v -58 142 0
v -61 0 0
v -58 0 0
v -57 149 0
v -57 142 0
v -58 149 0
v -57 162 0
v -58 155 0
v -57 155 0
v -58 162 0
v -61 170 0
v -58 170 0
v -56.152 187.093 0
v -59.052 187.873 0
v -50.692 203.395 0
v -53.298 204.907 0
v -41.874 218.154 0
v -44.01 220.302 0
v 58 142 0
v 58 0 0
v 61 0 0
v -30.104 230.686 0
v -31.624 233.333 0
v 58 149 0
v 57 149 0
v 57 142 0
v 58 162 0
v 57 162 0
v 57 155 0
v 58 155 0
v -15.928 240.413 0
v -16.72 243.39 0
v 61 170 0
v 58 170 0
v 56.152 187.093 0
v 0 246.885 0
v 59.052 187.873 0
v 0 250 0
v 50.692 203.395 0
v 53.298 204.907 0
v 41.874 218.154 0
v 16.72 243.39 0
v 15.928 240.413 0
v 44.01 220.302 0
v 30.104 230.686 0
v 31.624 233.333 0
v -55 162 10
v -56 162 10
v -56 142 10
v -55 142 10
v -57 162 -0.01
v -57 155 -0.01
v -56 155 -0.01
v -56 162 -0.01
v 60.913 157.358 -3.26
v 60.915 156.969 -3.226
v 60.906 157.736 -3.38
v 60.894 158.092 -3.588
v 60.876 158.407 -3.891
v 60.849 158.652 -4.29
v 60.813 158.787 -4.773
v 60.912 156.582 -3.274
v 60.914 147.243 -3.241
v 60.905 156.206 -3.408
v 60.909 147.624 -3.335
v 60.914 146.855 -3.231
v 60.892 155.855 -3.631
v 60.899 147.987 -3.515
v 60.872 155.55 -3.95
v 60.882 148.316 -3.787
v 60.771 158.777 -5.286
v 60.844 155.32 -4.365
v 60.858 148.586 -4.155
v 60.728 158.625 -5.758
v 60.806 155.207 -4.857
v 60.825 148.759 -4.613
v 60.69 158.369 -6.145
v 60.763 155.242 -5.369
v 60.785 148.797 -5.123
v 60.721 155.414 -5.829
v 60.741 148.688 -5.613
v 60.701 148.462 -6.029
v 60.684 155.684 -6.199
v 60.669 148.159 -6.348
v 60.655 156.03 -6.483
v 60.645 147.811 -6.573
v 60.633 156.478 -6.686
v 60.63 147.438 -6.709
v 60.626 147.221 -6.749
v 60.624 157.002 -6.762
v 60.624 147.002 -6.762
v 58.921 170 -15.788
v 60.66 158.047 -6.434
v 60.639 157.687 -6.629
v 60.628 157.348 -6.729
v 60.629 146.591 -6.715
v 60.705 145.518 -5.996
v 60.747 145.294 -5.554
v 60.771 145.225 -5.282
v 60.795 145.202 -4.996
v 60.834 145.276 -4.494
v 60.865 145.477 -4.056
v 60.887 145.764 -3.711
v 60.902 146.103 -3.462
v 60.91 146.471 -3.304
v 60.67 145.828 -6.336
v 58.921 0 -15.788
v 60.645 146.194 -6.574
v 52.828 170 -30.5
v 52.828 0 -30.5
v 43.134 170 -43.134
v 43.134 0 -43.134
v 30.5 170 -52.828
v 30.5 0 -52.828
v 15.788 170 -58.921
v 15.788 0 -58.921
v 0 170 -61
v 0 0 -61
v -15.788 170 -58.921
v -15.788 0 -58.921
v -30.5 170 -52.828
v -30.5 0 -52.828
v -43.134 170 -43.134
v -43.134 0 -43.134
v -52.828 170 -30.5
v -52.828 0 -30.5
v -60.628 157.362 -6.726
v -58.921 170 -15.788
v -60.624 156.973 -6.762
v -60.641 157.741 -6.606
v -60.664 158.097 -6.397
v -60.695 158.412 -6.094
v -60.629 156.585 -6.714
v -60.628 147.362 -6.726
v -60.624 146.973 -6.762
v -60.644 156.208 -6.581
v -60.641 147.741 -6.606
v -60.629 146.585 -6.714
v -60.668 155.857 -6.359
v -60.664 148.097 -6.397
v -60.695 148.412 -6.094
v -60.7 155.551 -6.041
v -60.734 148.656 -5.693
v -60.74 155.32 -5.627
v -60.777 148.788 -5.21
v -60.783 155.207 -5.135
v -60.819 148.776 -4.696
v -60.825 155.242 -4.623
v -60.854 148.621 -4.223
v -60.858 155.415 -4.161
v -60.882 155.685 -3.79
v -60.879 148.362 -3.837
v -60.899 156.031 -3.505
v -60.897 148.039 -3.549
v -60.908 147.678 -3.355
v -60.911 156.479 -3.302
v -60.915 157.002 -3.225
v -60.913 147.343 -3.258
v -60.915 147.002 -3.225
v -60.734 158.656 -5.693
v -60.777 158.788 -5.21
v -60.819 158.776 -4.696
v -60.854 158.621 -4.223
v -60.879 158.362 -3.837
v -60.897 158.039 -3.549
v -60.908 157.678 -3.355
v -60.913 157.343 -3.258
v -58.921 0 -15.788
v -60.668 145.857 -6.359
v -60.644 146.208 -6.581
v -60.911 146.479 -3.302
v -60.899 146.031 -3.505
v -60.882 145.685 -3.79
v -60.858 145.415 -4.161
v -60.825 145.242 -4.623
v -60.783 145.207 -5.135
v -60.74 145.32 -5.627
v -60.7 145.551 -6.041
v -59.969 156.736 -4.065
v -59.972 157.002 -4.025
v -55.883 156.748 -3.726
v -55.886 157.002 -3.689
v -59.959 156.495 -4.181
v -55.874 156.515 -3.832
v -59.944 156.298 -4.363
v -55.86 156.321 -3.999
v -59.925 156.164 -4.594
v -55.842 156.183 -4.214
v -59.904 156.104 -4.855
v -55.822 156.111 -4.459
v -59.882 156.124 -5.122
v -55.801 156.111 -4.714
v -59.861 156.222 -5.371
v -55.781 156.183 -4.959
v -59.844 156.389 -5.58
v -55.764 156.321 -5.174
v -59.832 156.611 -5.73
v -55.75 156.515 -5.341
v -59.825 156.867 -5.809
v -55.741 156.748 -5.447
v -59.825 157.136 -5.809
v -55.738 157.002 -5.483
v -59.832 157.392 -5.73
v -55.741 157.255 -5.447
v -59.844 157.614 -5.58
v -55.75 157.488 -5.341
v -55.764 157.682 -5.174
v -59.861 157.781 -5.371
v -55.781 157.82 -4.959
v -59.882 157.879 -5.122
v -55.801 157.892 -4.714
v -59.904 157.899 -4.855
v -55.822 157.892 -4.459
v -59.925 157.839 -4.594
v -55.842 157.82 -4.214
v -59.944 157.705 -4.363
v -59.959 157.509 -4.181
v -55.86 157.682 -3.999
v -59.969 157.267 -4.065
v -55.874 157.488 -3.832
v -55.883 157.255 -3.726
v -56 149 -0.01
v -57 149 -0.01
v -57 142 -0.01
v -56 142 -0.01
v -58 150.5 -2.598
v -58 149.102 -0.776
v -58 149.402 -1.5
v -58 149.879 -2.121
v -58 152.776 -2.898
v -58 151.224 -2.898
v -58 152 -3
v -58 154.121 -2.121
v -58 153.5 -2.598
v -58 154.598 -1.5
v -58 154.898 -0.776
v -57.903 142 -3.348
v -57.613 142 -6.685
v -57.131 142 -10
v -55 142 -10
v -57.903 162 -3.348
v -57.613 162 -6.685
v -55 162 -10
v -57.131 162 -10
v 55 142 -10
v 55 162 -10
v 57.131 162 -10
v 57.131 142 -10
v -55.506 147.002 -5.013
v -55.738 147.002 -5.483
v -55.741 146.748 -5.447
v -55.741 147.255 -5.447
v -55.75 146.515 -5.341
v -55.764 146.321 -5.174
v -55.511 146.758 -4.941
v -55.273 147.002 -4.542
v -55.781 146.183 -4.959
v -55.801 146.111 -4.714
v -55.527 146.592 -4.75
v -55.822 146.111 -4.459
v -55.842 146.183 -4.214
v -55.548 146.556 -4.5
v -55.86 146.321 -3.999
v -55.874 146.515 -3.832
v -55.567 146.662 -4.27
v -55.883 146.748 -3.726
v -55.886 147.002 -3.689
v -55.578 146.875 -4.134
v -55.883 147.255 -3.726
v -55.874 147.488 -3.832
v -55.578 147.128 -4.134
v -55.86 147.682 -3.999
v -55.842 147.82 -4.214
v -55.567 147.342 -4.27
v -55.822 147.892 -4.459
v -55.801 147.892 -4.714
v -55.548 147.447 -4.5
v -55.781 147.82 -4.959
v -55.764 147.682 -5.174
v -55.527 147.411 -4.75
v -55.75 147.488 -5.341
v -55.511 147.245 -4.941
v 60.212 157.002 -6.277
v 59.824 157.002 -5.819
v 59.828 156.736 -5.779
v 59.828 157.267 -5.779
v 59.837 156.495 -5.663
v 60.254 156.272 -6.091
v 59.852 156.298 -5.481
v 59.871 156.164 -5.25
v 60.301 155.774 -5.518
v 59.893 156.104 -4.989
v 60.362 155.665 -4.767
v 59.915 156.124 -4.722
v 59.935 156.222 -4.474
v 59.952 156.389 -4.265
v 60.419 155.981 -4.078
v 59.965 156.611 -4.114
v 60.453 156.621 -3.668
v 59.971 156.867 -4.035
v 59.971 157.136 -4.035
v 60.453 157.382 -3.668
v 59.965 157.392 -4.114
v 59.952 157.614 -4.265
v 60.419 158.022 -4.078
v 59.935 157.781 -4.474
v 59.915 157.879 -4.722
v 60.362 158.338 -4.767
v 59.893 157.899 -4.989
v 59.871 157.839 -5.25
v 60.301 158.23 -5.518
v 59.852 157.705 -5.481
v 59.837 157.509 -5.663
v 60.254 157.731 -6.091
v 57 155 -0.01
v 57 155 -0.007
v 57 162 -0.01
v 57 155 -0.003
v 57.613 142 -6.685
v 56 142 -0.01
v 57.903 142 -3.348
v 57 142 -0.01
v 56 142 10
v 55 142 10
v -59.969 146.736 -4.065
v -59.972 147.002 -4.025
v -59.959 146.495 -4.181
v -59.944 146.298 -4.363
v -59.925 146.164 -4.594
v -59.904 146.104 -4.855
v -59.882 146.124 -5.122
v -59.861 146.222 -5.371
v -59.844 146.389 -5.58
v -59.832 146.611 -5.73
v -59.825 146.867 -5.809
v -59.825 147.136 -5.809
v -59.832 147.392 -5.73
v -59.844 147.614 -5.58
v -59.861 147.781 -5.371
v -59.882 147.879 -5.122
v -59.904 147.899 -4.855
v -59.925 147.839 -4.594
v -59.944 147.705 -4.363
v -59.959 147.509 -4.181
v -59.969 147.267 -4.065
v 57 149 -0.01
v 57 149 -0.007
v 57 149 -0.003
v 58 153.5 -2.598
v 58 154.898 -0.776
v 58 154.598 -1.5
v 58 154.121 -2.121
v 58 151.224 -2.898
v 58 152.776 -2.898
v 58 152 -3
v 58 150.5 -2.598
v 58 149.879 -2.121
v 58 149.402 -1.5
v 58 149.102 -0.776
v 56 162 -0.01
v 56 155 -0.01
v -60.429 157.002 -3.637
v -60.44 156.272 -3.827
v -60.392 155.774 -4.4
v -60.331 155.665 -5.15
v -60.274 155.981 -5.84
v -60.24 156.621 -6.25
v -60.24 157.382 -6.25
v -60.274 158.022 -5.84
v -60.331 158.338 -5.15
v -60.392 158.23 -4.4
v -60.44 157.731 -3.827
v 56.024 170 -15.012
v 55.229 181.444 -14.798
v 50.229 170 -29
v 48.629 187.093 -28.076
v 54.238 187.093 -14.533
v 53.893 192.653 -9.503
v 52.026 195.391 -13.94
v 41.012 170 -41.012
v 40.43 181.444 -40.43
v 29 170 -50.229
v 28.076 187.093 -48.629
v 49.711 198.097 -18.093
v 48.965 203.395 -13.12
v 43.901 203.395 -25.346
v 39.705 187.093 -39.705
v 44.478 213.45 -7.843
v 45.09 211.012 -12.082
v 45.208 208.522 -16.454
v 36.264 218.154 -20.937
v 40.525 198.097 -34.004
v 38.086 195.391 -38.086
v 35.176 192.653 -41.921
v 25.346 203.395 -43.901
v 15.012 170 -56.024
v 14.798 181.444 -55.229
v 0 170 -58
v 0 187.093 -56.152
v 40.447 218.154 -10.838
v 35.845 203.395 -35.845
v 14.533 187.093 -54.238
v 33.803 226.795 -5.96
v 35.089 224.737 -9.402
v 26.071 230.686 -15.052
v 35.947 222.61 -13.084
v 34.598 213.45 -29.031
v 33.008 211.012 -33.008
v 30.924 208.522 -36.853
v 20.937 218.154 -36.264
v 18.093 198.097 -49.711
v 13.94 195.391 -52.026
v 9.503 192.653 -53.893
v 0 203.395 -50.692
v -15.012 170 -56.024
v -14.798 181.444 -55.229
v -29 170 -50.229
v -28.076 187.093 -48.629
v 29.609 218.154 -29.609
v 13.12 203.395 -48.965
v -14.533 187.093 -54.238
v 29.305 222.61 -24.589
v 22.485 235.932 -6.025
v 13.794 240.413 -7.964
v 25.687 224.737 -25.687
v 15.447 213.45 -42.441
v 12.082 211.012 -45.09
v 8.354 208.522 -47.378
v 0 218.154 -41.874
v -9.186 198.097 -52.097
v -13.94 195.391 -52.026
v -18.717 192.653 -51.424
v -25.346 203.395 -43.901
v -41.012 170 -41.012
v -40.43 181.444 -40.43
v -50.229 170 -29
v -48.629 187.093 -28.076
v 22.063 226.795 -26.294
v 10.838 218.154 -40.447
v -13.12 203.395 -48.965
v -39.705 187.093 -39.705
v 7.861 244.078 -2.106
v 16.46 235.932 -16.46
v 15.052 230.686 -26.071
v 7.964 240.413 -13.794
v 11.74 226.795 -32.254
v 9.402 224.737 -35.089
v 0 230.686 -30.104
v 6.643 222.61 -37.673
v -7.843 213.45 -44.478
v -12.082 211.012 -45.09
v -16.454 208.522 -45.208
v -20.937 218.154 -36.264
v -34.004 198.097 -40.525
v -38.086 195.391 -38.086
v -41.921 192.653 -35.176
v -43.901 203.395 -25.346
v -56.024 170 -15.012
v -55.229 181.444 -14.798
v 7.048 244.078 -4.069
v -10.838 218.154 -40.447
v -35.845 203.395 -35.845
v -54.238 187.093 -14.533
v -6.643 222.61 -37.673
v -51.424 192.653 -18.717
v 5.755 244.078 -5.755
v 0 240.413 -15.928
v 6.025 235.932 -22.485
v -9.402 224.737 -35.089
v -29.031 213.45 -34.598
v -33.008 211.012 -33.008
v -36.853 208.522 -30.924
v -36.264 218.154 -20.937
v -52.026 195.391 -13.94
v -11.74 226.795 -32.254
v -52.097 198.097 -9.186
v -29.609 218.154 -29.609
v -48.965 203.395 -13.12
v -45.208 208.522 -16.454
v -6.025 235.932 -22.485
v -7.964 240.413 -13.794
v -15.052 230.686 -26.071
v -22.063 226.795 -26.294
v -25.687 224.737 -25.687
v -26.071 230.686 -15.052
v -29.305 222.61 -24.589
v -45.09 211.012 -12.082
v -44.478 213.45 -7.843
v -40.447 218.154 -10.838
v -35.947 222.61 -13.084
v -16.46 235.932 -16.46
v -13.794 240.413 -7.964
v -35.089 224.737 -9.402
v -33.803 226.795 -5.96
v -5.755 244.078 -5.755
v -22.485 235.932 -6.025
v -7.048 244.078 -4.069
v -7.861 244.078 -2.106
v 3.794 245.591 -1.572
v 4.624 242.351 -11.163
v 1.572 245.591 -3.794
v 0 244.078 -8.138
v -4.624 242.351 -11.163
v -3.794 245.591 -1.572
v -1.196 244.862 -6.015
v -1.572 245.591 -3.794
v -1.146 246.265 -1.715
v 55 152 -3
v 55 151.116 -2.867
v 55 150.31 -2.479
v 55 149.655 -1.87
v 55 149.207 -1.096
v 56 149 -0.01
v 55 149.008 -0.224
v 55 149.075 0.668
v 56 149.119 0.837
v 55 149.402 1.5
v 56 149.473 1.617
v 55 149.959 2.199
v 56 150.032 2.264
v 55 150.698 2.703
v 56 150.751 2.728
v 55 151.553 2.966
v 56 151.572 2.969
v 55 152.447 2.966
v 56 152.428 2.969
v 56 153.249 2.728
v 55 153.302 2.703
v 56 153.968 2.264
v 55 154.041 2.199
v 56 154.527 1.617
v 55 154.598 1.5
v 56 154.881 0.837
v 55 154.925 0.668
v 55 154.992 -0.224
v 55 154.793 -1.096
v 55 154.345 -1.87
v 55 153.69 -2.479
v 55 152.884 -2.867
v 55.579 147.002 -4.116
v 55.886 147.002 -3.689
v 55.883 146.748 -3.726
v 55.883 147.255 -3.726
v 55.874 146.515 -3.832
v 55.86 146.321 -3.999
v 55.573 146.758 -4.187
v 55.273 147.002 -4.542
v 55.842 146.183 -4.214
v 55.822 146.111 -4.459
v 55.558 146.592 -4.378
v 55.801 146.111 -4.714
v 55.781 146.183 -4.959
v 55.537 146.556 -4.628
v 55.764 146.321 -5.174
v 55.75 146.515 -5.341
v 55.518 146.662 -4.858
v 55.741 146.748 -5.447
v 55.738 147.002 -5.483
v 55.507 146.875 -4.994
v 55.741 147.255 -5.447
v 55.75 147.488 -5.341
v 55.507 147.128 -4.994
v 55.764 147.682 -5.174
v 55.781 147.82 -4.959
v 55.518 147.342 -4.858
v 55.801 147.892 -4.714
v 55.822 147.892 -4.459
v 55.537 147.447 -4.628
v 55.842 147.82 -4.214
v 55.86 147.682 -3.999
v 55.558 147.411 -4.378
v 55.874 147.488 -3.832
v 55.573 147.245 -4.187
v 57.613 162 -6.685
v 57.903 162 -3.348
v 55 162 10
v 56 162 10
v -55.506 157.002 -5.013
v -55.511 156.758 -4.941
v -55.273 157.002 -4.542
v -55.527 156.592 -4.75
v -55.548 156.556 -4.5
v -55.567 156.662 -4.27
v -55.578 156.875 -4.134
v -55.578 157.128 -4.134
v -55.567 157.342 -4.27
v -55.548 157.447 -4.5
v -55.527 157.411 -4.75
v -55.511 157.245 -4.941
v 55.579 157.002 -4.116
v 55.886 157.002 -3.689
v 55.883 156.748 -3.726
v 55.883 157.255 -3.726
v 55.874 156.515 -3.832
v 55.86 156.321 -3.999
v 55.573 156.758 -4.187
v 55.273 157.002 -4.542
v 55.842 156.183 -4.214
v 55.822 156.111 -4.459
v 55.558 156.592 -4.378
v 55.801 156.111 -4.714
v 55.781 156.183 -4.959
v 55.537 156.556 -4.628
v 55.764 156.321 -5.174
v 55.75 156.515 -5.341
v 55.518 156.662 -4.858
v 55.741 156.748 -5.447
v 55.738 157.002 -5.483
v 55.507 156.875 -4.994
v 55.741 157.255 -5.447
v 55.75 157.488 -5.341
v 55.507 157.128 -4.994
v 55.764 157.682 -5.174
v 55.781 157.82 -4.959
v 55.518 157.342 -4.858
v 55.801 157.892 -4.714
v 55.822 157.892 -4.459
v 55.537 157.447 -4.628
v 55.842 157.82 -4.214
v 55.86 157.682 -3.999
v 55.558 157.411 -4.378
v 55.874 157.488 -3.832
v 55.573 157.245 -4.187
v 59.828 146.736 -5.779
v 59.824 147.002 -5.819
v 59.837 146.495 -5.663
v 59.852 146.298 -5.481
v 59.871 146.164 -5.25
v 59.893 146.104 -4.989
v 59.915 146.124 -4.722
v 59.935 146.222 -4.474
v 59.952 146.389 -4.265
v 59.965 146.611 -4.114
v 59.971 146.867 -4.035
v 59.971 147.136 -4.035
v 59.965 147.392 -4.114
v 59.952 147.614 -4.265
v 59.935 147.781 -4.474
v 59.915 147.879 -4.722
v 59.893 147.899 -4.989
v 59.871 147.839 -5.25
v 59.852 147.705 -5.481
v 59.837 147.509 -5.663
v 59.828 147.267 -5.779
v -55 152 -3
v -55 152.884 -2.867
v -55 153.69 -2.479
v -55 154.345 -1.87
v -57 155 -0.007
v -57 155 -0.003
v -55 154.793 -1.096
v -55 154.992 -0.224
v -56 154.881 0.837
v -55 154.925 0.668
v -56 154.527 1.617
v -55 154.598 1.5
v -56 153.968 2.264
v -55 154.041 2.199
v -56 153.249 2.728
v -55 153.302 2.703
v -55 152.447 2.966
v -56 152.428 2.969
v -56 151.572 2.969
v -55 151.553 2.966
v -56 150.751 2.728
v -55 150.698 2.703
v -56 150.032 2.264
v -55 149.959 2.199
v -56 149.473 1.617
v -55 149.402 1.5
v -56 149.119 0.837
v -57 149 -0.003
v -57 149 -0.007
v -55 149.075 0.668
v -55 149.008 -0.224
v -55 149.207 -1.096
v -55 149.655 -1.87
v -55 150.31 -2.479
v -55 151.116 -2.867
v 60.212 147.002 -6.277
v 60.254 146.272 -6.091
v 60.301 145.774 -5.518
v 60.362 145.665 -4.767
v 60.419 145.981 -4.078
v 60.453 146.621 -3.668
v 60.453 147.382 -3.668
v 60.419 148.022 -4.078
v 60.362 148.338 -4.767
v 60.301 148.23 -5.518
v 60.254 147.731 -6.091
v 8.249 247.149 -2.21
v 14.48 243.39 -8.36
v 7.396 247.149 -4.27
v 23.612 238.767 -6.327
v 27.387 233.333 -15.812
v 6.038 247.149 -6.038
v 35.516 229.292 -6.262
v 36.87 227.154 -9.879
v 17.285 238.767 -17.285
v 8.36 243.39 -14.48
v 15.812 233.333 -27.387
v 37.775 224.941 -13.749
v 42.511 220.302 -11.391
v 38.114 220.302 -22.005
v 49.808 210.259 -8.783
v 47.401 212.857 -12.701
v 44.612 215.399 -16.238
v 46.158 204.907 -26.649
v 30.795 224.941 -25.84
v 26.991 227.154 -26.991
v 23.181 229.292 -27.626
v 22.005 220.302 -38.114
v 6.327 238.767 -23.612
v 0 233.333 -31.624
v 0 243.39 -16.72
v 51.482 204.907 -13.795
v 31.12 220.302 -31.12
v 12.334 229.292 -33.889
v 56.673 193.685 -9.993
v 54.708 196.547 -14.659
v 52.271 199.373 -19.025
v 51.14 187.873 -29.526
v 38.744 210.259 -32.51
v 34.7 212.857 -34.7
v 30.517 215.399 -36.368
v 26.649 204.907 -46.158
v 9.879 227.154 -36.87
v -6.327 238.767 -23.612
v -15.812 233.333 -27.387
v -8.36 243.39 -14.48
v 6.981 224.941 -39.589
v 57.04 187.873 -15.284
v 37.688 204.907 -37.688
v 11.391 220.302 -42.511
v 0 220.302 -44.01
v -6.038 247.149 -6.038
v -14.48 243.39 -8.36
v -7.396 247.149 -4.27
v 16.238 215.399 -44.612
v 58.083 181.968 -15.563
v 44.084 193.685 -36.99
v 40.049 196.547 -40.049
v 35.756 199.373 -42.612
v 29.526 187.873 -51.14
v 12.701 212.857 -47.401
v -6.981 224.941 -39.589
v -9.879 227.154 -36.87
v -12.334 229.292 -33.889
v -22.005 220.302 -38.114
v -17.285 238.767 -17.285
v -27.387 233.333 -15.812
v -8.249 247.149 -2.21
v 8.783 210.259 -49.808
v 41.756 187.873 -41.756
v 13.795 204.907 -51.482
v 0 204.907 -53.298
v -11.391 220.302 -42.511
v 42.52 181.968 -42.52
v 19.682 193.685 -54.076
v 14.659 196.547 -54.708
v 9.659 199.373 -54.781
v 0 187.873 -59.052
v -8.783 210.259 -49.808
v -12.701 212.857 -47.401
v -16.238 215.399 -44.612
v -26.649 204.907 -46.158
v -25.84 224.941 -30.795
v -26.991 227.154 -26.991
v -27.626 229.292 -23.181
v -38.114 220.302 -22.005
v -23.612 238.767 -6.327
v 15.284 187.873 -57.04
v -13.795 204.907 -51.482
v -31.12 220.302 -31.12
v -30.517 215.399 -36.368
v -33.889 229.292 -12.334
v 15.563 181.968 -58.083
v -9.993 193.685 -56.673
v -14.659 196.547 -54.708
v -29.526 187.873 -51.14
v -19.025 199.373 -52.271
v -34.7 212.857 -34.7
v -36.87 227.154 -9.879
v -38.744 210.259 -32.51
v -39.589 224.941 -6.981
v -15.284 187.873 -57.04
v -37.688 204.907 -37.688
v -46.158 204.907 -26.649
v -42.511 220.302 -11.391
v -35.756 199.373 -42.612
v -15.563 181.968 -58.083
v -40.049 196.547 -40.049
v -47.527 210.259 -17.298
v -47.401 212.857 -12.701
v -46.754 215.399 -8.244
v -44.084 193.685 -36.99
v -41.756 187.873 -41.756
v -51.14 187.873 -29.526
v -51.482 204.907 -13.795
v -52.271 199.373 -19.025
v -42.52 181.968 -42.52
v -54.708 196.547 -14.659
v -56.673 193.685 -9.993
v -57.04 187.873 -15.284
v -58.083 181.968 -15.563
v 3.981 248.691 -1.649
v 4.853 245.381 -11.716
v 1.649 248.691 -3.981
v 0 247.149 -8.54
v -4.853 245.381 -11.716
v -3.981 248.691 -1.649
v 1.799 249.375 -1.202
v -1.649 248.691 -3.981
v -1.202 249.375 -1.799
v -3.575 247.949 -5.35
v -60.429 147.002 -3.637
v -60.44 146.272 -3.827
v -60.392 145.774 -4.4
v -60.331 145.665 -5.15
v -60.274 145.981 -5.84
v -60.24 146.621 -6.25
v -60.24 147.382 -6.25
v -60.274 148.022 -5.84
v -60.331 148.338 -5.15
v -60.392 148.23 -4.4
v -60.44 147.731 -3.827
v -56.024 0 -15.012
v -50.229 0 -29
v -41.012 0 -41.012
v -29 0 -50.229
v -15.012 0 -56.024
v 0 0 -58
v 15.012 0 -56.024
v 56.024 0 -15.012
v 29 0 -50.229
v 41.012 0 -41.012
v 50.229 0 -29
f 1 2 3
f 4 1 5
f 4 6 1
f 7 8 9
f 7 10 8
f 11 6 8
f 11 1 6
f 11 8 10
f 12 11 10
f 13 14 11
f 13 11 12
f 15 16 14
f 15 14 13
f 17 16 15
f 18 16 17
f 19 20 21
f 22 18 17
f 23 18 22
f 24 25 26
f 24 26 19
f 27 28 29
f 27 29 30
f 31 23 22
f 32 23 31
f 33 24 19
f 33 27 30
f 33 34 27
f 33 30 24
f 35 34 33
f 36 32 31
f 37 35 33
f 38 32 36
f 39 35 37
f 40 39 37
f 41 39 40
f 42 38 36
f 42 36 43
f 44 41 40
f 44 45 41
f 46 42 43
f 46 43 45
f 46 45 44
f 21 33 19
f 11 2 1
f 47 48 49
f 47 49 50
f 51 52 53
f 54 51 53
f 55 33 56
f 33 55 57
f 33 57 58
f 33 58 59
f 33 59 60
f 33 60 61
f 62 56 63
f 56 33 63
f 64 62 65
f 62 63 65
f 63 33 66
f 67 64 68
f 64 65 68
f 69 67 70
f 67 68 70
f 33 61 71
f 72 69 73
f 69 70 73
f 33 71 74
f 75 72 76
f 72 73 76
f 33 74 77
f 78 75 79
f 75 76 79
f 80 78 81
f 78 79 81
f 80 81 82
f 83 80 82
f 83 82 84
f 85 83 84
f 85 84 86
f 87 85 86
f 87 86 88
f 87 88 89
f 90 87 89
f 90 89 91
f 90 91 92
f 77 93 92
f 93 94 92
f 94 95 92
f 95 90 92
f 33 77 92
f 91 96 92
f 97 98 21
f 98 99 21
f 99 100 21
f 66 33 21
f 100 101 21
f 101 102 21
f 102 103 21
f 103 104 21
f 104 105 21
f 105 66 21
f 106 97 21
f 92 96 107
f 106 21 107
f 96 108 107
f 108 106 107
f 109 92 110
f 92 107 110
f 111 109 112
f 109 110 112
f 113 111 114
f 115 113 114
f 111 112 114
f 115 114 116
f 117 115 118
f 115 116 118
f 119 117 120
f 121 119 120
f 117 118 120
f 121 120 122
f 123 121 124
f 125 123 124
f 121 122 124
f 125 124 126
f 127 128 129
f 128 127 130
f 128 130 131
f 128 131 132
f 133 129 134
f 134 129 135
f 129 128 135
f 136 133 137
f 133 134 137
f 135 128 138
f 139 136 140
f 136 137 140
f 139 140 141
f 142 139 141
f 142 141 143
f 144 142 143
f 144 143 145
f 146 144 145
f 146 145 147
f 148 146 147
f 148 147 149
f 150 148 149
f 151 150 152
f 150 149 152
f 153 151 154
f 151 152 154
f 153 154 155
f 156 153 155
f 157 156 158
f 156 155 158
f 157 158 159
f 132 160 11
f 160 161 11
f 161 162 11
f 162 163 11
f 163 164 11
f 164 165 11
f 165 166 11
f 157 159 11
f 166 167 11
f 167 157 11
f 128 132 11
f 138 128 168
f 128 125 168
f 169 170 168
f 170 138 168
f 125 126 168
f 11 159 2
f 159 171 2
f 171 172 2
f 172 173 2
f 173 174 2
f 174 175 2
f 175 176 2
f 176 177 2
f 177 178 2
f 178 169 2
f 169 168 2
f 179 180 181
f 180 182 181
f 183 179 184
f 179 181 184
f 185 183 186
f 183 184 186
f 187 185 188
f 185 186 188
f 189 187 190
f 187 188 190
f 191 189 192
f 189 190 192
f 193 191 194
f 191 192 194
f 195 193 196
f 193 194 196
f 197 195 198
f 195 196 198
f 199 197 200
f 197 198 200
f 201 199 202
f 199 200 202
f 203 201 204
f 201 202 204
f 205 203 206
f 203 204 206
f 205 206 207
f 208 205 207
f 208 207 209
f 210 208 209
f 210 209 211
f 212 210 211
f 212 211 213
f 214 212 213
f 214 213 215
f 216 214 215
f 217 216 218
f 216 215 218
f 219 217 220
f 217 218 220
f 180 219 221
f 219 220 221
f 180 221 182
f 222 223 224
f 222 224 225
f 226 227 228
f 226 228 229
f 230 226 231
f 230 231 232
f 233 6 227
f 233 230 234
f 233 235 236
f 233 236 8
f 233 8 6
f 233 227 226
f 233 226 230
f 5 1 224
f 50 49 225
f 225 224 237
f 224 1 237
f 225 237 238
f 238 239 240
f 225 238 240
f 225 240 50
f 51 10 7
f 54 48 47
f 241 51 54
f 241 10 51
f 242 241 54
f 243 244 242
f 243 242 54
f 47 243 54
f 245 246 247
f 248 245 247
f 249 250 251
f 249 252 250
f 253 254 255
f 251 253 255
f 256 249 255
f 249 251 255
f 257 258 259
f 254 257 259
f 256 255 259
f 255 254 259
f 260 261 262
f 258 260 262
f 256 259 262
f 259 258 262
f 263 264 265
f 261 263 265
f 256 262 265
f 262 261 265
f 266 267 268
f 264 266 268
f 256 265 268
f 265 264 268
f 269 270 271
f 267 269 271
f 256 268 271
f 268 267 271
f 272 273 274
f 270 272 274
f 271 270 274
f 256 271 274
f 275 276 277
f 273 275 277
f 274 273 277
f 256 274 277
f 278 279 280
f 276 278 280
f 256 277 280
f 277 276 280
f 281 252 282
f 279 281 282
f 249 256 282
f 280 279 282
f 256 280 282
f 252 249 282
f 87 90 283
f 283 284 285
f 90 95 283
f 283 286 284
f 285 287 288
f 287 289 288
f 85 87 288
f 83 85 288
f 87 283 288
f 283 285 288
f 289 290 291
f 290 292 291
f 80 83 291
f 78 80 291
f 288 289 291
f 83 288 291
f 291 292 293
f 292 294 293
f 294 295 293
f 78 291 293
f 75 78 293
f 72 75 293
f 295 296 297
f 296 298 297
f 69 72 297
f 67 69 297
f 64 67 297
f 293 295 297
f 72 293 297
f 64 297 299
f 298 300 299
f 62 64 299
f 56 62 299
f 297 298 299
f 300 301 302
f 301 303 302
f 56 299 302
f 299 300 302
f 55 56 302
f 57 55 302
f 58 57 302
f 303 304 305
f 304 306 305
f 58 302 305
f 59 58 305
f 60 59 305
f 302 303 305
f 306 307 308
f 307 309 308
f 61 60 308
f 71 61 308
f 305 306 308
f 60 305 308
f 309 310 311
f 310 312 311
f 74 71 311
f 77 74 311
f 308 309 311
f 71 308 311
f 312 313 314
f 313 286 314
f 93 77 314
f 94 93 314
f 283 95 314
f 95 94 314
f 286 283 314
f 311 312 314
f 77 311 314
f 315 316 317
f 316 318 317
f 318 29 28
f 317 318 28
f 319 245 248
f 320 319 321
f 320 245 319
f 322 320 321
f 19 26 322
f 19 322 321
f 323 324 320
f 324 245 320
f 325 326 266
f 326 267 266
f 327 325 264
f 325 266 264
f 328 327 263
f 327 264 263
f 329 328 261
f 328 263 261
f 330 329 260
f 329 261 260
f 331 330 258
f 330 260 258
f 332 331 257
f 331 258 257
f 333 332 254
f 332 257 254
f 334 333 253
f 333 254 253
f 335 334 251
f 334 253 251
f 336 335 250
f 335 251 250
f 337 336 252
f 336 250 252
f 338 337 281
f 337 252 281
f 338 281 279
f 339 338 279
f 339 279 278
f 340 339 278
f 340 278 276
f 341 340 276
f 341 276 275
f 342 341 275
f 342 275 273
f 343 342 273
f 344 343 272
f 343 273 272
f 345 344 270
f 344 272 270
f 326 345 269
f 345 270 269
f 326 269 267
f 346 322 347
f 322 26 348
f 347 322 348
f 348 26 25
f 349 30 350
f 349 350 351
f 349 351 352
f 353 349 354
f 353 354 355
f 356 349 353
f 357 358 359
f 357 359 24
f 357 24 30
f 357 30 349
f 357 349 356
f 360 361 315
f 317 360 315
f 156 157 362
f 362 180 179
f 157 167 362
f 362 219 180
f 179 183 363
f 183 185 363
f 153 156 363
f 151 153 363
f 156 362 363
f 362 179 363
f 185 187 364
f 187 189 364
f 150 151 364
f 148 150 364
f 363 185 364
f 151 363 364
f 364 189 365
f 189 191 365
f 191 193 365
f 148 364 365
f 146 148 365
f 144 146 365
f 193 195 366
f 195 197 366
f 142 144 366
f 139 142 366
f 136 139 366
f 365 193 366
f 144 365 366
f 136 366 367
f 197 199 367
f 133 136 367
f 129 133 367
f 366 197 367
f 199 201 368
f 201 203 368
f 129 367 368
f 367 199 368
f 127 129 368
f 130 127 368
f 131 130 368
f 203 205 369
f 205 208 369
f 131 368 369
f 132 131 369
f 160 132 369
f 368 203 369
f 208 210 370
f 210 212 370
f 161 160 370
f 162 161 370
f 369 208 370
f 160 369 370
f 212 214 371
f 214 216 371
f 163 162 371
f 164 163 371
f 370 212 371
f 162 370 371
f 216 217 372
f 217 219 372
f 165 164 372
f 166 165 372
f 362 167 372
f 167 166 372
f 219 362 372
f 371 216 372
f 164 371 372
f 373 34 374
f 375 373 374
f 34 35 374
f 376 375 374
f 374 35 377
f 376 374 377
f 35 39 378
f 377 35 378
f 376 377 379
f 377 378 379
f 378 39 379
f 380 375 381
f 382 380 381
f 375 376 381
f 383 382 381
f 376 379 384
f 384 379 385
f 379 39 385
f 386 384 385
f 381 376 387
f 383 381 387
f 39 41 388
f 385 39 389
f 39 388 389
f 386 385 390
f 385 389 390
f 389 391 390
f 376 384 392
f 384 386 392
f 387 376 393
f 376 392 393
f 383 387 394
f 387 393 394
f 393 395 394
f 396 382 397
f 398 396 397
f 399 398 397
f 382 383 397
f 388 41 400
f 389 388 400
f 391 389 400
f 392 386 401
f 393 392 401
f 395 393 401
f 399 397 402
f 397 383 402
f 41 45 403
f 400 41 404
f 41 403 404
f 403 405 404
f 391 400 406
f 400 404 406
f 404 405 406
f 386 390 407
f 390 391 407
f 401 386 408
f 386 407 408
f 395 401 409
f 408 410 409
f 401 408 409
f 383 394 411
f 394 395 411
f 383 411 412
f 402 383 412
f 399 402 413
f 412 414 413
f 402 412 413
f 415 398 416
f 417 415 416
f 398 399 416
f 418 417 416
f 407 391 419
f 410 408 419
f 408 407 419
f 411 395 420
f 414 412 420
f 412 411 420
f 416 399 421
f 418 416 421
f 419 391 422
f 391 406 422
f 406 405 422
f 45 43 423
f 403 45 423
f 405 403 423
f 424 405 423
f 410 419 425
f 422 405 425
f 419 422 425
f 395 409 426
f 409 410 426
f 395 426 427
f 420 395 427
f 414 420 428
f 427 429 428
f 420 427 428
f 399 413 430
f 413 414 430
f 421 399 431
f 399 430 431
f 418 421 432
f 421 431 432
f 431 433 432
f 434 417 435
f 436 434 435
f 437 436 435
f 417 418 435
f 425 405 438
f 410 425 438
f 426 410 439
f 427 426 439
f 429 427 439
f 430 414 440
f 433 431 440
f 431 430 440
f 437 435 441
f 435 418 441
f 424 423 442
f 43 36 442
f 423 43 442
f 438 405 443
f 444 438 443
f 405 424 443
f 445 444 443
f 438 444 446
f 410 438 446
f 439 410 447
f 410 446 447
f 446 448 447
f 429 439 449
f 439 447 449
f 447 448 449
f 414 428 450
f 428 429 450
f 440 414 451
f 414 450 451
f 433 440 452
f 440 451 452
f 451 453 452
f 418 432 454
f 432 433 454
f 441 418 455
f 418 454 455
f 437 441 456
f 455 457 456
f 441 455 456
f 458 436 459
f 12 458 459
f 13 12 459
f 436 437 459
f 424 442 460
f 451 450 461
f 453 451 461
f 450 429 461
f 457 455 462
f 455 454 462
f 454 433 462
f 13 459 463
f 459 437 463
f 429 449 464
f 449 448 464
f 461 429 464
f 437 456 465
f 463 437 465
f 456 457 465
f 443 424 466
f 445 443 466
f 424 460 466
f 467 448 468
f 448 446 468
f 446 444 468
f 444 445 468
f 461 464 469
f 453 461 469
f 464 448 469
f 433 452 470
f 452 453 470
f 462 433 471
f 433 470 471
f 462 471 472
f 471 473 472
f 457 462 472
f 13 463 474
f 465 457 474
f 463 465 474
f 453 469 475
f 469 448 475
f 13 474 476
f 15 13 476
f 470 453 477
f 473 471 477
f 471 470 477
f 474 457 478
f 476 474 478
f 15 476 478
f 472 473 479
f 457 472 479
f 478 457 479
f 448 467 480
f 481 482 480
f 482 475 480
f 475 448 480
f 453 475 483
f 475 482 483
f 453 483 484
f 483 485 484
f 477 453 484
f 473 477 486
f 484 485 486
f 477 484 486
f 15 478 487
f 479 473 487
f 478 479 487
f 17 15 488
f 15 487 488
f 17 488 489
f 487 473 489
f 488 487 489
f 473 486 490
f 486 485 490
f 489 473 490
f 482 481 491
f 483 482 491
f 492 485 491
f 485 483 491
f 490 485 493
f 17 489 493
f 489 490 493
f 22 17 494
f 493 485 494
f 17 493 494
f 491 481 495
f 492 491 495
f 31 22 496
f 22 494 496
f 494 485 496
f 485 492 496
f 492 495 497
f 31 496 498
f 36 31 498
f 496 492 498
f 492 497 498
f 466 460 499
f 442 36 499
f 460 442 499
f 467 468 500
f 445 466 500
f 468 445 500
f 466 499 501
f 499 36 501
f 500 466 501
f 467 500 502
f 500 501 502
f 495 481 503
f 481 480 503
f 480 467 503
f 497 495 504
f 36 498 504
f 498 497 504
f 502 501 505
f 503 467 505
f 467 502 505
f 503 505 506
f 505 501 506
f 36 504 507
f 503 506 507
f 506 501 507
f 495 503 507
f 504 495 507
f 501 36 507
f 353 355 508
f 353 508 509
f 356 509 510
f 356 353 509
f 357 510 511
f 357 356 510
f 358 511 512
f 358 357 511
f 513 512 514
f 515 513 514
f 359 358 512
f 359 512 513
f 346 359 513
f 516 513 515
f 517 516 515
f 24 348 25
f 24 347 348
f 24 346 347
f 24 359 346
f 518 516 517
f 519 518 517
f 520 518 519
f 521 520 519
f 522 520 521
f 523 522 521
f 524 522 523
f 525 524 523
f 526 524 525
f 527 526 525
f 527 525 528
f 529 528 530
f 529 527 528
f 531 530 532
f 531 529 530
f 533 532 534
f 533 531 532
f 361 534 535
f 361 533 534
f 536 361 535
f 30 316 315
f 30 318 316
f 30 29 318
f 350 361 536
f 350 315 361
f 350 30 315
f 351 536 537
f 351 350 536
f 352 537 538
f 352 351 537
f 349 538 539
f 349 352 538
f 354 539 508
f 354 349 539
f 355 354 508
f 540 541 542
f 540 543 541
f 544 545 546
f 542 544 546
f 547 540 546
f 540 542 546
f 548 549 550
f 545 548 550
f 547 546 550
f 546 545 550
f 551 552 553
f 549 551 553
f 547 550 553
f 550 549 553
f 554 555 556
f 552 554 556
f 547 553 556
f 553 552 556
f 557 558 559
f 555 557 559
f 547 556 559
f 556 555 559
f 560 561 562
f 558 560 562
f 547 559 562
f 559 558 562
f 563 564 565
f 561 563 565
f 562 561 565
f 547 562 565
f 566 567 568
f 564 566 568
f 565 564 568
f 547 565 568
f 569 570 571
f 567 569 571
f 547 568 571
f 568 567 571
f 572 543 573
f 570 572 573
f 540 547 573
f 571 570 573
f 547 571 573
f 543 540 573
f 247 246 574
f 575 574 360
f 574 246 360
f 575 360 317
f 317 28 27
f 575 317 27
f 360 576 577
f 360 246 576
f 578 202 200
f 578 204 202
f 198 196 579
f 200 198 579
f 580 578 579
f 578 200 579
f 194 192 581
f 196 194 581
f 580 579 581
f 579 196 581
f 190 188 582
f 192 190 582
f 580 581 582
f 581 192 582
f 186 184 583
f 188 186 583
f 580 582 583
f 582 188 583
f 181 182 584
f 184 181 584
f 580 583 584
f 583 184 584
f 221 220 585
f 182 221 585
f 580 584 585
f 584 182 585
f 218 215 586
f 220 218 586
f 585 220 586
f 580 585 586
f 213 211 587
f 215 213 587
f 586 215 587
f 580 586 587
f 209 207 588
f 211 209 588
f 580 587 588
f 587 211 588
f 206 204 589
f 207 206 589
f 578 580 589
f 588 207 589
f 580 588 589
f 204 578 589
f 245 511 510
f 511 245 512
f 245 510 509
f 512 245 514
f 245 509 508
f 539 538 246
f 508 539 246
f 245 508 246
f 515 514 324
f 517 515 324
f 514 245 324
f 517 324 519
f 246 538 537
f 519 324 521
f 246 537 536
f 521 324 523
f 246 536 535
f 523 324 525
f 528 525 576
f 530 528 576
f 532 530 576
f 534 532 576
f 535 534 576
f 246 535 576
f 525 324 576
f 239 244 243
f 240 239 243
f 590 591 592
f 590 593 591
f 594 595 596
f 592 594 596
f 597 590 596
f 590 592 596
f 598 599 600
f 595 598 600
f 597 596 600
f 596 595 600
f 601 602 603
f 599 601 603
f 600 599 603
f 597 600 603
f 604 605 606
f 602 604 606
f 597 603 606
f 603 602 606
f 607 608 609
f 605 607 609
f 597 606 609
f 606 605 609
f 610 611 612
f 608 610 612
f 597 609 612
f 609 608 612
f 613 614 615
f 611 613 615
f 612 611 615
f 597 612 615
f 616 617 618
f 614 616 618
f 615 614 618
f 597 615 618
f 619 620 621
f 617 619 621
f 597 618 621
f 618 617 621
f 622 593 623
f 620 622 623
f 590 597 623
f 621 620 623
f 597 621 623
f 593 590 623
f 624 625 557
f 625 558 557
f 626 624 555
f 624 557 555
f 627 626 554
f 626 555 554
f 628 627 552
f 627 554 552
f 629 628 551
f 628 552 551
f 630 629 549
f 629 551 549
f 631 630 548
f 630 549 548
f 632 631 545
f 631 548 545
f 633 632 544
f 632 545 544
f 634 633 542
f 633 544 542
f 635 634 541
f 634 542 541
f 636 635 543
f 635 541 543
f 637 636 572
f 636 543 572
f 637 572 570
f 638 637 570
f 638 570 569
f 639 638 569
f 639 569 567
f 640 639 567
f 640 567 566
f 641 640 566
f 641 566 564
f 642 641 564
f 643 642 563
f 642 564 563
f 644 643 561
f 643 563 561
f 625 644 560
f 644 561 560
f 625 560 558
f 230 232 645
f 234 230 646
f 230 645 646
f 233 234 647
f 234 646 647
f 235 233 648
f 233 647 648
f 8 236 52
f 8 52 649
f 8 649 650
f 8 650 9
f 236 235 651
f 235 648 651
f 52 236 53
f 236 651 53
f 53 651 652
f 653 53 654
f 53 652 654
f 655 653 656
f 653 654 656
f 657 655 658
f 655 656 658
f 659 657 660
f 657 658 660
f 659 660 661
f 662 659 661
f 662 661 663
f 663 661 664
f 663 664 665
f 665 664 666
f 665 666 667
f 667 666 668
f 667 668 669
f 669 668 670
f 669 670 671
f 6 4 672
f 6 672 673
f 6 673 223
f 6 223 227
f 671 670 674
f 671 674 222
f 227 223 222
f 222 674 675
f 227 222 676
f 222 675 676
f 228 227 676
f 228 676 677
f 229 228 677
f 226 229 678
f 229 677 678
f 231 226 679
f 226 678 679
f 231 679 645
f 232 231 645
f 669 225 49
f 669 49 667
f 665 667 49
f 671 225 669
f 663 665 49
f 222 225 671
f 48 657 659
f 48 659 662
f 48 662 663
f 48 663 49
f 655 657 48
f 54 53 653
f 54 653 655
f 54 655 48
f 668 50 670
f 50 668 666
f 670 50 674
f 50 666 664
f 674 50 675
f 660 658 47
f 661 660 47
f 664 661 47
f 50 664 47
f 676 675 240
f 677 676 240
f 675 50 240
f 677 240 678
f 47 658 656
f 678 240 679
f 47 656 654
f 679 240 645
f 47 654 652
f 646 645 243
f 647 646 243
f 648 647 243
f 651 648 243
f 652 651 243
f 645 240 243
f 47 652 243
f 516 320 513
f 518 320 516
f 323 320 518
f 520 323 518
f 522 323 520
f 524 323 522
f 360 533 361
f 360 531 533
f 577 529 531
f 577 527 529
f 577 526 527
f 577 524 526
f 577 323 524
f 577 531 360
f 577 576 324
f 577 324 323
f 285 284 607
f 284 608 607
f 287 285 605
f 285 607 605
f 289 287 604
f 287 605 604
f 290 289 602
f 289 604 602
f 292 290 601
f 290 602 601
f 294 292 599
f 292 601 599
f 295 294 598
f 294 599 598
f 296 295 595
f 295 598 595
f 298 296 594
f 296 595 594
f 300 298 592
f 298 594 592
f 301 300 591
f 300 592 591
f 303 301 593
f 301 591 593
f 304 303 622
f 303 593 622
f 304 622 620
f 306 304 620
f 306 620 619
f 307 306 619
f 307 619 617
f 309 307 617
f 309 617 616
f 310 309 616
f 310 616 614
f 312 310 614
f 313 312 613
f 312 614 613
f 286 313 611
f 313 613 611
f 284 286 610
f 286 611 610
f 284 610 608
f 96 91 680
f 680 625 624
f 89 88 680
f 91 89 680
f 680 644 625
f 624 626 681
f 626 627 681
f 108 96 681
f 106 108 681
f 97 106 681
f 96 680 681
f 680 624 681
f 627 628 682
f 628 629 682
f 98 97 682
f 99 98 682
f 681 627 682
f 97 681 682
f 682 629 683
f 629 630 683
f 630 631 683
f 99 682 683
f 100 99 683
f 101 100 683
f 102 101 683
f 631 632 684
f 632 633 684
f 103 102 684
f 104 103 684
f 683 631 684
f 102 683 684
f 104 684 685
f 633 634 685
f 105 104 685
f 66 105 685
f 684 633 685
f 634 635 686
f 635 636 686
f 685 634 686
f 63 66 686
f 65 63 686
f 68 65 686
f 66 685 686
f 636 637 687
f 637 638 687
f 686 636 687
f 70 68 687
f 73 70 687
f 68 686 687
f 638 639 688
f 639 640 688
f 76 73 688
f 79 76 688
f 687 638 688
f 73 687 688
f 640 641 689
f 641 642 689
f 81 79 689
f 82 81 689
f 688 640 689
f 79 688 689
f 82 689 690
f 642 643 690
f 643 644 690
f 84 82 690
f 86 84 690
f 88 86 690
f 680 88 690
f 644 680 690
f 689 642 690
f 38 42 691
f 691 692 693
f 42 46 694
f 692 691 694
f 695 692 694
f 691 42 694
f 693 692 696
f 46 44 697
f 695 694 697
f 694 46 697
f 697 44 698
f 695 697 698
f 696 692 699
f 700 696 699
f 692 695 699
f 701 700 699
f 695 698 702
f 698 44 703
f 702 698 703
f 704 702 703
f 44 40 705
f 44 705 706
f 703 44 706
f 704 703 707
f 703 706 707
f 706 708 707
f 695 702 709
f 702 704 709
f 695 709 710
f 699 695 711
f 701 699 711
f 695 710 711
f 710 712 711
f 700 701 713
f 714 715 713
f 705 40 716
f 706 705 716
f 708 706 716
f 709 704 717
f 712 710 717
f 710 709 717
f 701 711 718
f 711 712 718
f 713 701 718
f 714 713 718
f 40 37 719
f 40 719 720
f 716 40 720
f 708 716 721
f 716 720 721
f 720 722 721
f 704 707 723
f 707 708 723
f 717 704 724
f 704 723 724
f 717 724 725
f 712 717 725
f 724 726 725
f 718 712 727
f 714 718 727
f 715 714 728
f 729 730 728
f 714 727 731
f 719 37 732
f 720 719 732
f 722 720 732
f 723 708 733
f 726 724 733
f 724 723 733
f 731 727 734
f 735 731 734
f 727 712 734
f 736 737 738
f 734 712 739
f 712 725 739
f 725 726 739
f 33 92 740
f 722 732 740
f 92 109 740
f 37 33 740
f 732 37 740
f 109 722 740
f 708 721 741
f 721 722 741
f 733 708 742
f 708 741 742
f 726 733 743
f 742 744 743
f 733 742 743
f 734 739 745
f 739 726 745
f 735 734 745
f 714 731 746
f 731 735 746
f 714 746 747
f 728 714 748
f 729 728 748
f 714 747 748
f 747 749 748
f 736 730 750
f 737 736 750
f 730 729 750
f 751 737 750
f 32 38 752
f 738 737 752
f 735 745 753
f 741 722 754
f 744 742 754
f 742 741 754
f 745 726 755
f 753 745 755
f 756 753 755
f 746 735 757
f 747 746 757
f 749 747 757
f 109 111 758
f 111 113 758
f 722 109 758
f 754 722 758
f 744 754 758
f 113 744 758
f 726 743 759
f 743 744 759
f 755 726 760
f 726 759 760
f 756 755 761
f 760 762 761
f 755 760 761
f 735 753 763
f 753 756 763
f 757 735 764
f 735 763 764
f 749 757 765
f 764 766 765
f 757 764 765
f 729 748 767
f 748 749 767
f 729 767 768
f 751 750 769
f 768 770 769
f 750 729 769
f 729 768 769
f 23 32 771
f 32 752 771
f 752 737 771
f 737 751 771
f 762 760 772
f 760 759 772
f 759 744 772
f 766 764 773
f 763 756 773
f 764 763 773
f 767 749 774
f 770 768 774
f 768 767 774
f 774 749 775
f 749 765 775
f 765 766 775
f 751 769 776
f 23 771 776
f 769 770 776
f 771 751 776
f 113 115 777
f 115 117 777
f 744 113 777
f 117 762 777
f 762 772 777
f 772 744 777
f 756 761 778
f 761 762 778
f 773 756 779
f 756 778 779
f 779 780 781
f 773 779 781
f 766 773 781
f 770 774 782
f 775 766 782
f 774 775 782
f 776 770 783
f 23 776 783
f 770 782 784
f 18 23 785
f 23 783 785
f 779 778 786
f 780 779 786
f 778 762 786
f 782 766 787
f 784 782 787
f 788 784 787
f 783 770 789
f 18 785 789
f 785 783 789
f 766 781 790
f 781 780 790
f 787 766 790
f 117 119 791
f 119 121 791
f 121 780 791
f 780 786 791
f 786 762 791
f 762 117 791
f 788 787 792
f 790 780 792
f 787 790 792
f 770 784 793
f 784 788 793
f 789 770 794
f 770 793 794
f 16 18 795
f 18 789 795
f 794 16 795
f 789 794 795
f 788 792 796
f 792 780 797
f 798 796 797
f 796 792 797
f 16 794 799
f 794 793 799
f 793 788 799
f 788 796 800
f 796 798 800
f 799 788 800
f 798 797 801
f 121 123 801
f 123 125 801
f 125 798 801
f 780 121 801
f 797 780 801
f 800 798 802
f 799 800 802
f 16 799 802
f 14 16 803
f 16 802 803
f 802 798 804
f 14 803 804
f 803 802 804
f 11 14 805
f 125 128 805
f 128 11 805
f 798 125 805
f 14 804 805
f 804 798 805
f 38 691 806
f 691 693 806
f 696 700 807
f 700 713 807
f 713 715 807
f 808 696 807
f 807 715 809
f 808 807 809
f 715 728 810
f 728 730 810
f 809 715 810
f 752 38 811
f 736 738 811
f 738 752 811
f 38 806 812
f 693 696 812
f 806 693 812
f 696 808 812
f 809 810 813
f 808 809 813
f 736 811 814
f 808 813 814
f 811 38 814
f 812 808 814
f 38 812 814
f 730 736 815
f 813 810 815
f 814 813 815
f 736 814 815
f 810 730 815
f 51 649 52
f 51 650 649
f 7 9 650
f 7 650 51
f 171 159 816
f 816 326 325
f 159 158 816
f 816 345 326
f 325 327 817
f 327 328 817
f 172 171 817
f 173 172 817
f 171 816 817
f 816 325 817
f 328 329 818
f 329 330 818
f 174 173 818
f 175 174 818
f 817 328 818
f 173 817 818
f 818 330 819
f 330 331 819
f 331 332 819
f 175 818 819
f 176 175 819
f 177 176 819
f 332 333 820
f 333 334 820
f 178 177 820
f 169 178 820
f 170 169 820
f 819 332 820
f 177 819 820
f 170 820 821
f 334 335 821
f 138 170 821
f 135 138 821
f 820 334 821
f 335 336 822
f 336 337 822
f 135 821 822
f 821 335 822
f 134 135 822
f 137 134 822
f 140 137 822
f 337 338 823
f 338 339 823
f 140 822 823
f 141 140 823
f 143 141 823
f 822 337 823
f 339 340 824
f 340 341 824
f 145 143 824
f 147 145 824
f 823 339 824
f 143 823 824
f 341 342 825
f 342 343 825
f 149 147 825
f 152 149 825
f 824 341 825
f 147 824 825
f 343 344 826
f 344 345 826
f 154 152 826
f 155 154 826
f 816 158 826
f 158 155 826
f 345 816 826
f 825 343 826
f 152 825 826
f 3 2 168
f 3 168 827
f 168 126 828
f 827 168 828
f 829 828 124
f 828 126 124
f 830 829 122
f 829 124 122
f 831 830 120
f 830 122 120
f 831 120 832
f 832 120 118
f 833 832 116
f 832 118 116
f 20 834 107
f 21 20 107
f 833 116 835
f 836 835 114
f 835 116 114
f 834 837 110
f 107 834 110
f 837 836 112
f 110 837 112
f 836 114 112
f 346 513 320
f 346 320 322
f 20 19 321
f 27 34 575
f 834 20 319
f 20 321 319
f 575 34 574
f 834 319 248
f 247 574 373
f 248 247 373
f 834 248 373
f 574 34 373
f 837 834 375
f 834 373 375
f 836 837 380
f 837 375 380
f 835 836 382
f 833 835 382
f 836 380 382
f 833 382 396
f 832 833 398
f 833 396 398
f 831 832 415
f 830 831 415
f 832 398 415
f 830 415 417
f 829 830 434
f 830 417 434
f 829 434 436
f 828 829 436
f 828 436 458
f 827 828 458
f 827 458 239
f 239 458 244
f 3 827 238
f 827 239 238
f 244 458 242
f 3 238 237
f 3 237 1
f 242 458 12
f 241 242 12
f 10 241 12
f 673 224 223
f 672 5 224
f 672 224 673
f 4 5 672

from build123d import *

# Parameters (mm, degrees)
REVOLVE1_ANGLE                                       = 180
SKETCH2_W                                            = 3
SKETCH2_H                                            = 20
BOSS_EXTRUDE1_DEPTH                                  = 10
SKETCH4_W                                            = 1
SKETCH4_H                                            = 20
CUT_EXTRUDE1_DEPTH                                   = 0.01
CSK_FOR_M1_6_COUNTERSUNK_FLAT_HEAD_SCREW_D           = 1.8
CSK_FOR_M1_6_COUNTERSUNK_FLAT_HEAD_SCREW_DEPTH       = 5
CSK_FOR_M1_6_COUNTERSUNK_FLAT_HEAD_SCREW_CSINK_D     = 3.6
CSK_FOR_M1_6_COUNTERSUNK_FLAT_HEAD_SCREW_CSINK_ANGLE = 90
CSK_FOR_M1_6_COUNTERSUNK_FLAT_HEAD_SCREW_TIP         = 0.540774557
CSK_FOR_M1_6_COUNTERSUNK_FLAT_HEAD_S_2_D             = 1.8
CSK_FOR_M1_6_COUNTERSUNK_FLAT_HEAD_S_2_DEPTH         = 5
CSK_FOR_M1_6_COUNTERSUNK_FLAT_HEAD_S_2_CSINK_D       = 3.6
CSK_FOR_M1_6_COUNTERSUNK_FLAT_HEAD_S_2_CSINK_ANGLE   = 90
CSK_FOR_M1_6_COUNTERSUNK_FLAT_HEAD_S_2_TIP           = 0.540774557
CSK_FOR_M1_6_COUNTERSUNK_FLAT_HEAD_S_3_D             = 1.8
CSK_FOR_M1_6_COUNTERSUNK_FLAT_HEAD_S_3_DEPTH         = 5
CSK_FOR_M1_6_COUNTERSUNK_FLAT_HEAD_S_3_CSINK_D       = 3.6
CSK_FOR_M1_6_COUNTERSUNK_FLAT_HEAD_S_3_CSINK_ANGLE   = 90
CSK_FOR_M1_6_COUNTERSUNK_FLAT_HEAD_S_3_TIP           = 0.540774557
SKETCH10_W                                           = 1
SKETCH10_H                                           = 20
BOSS_EXTRUDE2_DEPTH                                  = 10.01
SKETCH12_R                                           = 3
CUT_EXTRUDE4_DEPTH                                   = 3
CUT_EXTRUDE5_START                                   = -3
SKETCH13_R                                           = 3
CUT_EXTRUDE5_DEPTH                                   = 3


with BuildPart() as part:
    # Sketch1 → Revolve1 (revolve)
    with BuildSketch(Plane.XY):
        with BuildLine():
            Line((61, 170), (61, 0))
            Line((61, 0), (58, 0))
            Line((58, 0), (58, 170))
            ThreePointArc((58, 170), (41.873834296, 218.154039035), (0, 246.884627213))
            Line((0, 246.884627213), (0, 250))
            ThreePointArc((0, 250), (44.010282534, 220.301590432), (61, 170))
        make_face()
    revolve(axis=Axis((0, 0, 0), (0, 1, 0)), revolution_arc=REVOLVE1_ANGLE)

    # Sketch2 → Boss-Extrude1 (add)
    with BuildSketch(Plane.XY):
        with Locations((56.5, 152)):
            Rectangle(SKETCH2_W, SKETCH2_H)
        with Locations((-56.5, 152)):
            Rectangle(SKETCH2_W, SKETCH2_H)
    extrude(amount=-BOSS_EXTRUDE1_DEPTH)

    # Sketch4 → Cut-Extrude1 (cut)
    with BuildSketch(Plane.XY):
        with Locations((-56.5, 152)):
            Rectangle(SKETCH4_W, SKETCH4_H)
        with Locations((56.5, 152)):
            Rectangle(SKETCH4_W, SKETCH4_H)
    extrude(amount=-CUT_EXTRUDE1_DEPTH, mode=Mode.SUBTRACT)

    # CSK for M1.6 Countersunk Flat Head Screw2
    with Locations(Plane(origin=(60.795081967, 157.001615154, -4.995799095), x_dir=(0.081898345823, 0, 0.996640687987), z_dir=(0.996640687987, 0, -0.081898345823))):
        with Locations((0, 0)):
            CounterSinkHole(CSK_FOR_M1_6_COUNTERSUNK_FLAT_HEAD_SCREW_D / 2, CSK_FOR_M1_6_COUNTERSUNK_FLAT_HEAD_SCREW_CSINK_D / 2, depth=CSK_FOR_M1_6_COUNTERSUNK_FLAT_HEAD_SCREW_DEPTH, counter_sink_angle=CSK_FOR_M1_6_COUNTERSUNK_FLAT_HEAD_SCREW_CSINK_ANGLE)
            with Locations((0, 0, -(CSK_FOR_M1_6_COUNTERSUNK_FLAT_HEAD_SCREW_DEPTH + CSK_FOR_M1_6_COUNTERSUNK_FLAT_HEAD_SCREW_TIP / 2))):  # 118° drill point
                Cone(0, CSK_FOR_M1_6_COUNTERSUNK_FLAT_HEAD_SCREW_D / 2, CSK_FOR_M1_6_COUNTERSUNK_FLAT_HEAD_SCREW_TIP, mode=Mode.SUBTRACT)

    # CSK for M1.6 Countersunk Flat Head S 2
    with Locations(Plane(origin=(60.795081967, 147.001615154, -4.995799095), x_dir=(0.081897976852, 0, 0.996640718307), z_dir=(0.996640718307, 0, -0.081897976852))):
        with Locations((0, 0)):
            CounterSinkHole(CSK_FOR_M1_6_COUNTERSUNK_FLAT_HEAD_S_2_D / 2, CSK_FOR_M1_6_COUNTERSUNK_FLAT_HEAD_S_2_CSINK_D / 2, depth=CSK_FOR_M1_6_COUNTERSUNK_FLAT_HEAD_S_2_DEPTH, counter_sink_angle=CSK_FOR_M1_6_COUNTERSUNK_FLAT_HEAD_S_2_CSINK_ANGLE)
            with Locations((0, 0, -(CSK_FOR_M1_6_COUNTERSUNK_FLAT_HEAD_S_2_DEPTH + CSK_FOR_M1_6_COUNTERSUNK_FLAT_HEAD_S_2_TIP / 2))):  # 118° drill point
                Cone(0, CSK_FOR_M1_6_COUNTERSUNK_FLAT_HEAD_S_2_D / 2, CSK_FOR_M1_6_COUNTERSUNK_FLAT_HEAD_S_2_TIP, mode=Mode.SUBTRACT)

    # CSK for M1.6 Countersunk Flat Head S 3
    with Locations(Plane(origin=(-60.795081967, 147.001615154, -4.995799095), x_dir=(0.081897976852, 0, -0.996640718307), z_dir=(-0.996640718307, 0, -0.081897976852))):
        with Locations((0, 0), (0, -10)):
            CounterSinkHole(CSK_FOR_M1_6_COUNTERSUNK_FLAT_HEAD_S_3_D / 2, CSK_FOR_M1_6_COUNTERSUNK_FLAT_HEAD_S_3_CSINK_D / 2, depth=CSK_FOR_M1_6_COUNTERSUNK_FLAT_HEAD_S_3_DEPTH, counter_sink_angle=CSK_FOR_M1_6_COUNTERSUNK_FLAT_HEAD_S_3_CSINK_ANGLE)
            with Locations((0, 0, -(CSK_FOR_M1_6_COUNTERSUNK_FLAT_HEAD_S_3_DEPTH + CSK_FOR_M1_6_COUNTERSUNK_FLAT_HEAD_S_3_TIP / 2))):  # 118° drill point
                Cone(0, CSK_FOR_M1_6_COUNTERSUNK_FLAT_HEAD_S_3_D / 2, CSK_FOR_M1_6_COUNTERSUNK_FLAT_HEAD_S_3_TIP, mode=Mode.SUBTRACT)

    # Sketch10 → Boss-Extrude2 (add)
    with BuildSketch(Plane.XY.offset(-0.01)):
        with Locations((-55.5, 152)):
            Rectangle(SKETCH10_W, SKETCH10_H)
        with Locations((55.5, 152)):
            Rectangle(SKETCH10_W, SKETCH10_H)
    extrude(amount=BOSS_EXTRUDE2_DEPTH)

    # Sketch12 → Cut-Extrude4 (cut)
    with BuildSketch(Plane(origin=(-55, 0, 0), x_dir=(0, 0, -1), z_dir=(1, 0, 0))):
        with Locations((0, 152)):
            Circle(SKETCH12_R)
    extrude(amount=-CUT_EXTRUDE4_DEPTH, mode=Mode.SUBTRACT)

    # Sketch13 → Cut-Extrude5 (cut)
    with BuildSketch(Plane.ZY.offset(-55).offset(CUT_EXTRUDE5_START)):
        with Locations(Location((0, 152, 0), (0, 0, 180))):
            Circle(SKETCH13_R)
    extrude(amount=CUT_EXTRUDE5_DEPTH, mode=Mode.SUBTRACT)


solid = part.part
